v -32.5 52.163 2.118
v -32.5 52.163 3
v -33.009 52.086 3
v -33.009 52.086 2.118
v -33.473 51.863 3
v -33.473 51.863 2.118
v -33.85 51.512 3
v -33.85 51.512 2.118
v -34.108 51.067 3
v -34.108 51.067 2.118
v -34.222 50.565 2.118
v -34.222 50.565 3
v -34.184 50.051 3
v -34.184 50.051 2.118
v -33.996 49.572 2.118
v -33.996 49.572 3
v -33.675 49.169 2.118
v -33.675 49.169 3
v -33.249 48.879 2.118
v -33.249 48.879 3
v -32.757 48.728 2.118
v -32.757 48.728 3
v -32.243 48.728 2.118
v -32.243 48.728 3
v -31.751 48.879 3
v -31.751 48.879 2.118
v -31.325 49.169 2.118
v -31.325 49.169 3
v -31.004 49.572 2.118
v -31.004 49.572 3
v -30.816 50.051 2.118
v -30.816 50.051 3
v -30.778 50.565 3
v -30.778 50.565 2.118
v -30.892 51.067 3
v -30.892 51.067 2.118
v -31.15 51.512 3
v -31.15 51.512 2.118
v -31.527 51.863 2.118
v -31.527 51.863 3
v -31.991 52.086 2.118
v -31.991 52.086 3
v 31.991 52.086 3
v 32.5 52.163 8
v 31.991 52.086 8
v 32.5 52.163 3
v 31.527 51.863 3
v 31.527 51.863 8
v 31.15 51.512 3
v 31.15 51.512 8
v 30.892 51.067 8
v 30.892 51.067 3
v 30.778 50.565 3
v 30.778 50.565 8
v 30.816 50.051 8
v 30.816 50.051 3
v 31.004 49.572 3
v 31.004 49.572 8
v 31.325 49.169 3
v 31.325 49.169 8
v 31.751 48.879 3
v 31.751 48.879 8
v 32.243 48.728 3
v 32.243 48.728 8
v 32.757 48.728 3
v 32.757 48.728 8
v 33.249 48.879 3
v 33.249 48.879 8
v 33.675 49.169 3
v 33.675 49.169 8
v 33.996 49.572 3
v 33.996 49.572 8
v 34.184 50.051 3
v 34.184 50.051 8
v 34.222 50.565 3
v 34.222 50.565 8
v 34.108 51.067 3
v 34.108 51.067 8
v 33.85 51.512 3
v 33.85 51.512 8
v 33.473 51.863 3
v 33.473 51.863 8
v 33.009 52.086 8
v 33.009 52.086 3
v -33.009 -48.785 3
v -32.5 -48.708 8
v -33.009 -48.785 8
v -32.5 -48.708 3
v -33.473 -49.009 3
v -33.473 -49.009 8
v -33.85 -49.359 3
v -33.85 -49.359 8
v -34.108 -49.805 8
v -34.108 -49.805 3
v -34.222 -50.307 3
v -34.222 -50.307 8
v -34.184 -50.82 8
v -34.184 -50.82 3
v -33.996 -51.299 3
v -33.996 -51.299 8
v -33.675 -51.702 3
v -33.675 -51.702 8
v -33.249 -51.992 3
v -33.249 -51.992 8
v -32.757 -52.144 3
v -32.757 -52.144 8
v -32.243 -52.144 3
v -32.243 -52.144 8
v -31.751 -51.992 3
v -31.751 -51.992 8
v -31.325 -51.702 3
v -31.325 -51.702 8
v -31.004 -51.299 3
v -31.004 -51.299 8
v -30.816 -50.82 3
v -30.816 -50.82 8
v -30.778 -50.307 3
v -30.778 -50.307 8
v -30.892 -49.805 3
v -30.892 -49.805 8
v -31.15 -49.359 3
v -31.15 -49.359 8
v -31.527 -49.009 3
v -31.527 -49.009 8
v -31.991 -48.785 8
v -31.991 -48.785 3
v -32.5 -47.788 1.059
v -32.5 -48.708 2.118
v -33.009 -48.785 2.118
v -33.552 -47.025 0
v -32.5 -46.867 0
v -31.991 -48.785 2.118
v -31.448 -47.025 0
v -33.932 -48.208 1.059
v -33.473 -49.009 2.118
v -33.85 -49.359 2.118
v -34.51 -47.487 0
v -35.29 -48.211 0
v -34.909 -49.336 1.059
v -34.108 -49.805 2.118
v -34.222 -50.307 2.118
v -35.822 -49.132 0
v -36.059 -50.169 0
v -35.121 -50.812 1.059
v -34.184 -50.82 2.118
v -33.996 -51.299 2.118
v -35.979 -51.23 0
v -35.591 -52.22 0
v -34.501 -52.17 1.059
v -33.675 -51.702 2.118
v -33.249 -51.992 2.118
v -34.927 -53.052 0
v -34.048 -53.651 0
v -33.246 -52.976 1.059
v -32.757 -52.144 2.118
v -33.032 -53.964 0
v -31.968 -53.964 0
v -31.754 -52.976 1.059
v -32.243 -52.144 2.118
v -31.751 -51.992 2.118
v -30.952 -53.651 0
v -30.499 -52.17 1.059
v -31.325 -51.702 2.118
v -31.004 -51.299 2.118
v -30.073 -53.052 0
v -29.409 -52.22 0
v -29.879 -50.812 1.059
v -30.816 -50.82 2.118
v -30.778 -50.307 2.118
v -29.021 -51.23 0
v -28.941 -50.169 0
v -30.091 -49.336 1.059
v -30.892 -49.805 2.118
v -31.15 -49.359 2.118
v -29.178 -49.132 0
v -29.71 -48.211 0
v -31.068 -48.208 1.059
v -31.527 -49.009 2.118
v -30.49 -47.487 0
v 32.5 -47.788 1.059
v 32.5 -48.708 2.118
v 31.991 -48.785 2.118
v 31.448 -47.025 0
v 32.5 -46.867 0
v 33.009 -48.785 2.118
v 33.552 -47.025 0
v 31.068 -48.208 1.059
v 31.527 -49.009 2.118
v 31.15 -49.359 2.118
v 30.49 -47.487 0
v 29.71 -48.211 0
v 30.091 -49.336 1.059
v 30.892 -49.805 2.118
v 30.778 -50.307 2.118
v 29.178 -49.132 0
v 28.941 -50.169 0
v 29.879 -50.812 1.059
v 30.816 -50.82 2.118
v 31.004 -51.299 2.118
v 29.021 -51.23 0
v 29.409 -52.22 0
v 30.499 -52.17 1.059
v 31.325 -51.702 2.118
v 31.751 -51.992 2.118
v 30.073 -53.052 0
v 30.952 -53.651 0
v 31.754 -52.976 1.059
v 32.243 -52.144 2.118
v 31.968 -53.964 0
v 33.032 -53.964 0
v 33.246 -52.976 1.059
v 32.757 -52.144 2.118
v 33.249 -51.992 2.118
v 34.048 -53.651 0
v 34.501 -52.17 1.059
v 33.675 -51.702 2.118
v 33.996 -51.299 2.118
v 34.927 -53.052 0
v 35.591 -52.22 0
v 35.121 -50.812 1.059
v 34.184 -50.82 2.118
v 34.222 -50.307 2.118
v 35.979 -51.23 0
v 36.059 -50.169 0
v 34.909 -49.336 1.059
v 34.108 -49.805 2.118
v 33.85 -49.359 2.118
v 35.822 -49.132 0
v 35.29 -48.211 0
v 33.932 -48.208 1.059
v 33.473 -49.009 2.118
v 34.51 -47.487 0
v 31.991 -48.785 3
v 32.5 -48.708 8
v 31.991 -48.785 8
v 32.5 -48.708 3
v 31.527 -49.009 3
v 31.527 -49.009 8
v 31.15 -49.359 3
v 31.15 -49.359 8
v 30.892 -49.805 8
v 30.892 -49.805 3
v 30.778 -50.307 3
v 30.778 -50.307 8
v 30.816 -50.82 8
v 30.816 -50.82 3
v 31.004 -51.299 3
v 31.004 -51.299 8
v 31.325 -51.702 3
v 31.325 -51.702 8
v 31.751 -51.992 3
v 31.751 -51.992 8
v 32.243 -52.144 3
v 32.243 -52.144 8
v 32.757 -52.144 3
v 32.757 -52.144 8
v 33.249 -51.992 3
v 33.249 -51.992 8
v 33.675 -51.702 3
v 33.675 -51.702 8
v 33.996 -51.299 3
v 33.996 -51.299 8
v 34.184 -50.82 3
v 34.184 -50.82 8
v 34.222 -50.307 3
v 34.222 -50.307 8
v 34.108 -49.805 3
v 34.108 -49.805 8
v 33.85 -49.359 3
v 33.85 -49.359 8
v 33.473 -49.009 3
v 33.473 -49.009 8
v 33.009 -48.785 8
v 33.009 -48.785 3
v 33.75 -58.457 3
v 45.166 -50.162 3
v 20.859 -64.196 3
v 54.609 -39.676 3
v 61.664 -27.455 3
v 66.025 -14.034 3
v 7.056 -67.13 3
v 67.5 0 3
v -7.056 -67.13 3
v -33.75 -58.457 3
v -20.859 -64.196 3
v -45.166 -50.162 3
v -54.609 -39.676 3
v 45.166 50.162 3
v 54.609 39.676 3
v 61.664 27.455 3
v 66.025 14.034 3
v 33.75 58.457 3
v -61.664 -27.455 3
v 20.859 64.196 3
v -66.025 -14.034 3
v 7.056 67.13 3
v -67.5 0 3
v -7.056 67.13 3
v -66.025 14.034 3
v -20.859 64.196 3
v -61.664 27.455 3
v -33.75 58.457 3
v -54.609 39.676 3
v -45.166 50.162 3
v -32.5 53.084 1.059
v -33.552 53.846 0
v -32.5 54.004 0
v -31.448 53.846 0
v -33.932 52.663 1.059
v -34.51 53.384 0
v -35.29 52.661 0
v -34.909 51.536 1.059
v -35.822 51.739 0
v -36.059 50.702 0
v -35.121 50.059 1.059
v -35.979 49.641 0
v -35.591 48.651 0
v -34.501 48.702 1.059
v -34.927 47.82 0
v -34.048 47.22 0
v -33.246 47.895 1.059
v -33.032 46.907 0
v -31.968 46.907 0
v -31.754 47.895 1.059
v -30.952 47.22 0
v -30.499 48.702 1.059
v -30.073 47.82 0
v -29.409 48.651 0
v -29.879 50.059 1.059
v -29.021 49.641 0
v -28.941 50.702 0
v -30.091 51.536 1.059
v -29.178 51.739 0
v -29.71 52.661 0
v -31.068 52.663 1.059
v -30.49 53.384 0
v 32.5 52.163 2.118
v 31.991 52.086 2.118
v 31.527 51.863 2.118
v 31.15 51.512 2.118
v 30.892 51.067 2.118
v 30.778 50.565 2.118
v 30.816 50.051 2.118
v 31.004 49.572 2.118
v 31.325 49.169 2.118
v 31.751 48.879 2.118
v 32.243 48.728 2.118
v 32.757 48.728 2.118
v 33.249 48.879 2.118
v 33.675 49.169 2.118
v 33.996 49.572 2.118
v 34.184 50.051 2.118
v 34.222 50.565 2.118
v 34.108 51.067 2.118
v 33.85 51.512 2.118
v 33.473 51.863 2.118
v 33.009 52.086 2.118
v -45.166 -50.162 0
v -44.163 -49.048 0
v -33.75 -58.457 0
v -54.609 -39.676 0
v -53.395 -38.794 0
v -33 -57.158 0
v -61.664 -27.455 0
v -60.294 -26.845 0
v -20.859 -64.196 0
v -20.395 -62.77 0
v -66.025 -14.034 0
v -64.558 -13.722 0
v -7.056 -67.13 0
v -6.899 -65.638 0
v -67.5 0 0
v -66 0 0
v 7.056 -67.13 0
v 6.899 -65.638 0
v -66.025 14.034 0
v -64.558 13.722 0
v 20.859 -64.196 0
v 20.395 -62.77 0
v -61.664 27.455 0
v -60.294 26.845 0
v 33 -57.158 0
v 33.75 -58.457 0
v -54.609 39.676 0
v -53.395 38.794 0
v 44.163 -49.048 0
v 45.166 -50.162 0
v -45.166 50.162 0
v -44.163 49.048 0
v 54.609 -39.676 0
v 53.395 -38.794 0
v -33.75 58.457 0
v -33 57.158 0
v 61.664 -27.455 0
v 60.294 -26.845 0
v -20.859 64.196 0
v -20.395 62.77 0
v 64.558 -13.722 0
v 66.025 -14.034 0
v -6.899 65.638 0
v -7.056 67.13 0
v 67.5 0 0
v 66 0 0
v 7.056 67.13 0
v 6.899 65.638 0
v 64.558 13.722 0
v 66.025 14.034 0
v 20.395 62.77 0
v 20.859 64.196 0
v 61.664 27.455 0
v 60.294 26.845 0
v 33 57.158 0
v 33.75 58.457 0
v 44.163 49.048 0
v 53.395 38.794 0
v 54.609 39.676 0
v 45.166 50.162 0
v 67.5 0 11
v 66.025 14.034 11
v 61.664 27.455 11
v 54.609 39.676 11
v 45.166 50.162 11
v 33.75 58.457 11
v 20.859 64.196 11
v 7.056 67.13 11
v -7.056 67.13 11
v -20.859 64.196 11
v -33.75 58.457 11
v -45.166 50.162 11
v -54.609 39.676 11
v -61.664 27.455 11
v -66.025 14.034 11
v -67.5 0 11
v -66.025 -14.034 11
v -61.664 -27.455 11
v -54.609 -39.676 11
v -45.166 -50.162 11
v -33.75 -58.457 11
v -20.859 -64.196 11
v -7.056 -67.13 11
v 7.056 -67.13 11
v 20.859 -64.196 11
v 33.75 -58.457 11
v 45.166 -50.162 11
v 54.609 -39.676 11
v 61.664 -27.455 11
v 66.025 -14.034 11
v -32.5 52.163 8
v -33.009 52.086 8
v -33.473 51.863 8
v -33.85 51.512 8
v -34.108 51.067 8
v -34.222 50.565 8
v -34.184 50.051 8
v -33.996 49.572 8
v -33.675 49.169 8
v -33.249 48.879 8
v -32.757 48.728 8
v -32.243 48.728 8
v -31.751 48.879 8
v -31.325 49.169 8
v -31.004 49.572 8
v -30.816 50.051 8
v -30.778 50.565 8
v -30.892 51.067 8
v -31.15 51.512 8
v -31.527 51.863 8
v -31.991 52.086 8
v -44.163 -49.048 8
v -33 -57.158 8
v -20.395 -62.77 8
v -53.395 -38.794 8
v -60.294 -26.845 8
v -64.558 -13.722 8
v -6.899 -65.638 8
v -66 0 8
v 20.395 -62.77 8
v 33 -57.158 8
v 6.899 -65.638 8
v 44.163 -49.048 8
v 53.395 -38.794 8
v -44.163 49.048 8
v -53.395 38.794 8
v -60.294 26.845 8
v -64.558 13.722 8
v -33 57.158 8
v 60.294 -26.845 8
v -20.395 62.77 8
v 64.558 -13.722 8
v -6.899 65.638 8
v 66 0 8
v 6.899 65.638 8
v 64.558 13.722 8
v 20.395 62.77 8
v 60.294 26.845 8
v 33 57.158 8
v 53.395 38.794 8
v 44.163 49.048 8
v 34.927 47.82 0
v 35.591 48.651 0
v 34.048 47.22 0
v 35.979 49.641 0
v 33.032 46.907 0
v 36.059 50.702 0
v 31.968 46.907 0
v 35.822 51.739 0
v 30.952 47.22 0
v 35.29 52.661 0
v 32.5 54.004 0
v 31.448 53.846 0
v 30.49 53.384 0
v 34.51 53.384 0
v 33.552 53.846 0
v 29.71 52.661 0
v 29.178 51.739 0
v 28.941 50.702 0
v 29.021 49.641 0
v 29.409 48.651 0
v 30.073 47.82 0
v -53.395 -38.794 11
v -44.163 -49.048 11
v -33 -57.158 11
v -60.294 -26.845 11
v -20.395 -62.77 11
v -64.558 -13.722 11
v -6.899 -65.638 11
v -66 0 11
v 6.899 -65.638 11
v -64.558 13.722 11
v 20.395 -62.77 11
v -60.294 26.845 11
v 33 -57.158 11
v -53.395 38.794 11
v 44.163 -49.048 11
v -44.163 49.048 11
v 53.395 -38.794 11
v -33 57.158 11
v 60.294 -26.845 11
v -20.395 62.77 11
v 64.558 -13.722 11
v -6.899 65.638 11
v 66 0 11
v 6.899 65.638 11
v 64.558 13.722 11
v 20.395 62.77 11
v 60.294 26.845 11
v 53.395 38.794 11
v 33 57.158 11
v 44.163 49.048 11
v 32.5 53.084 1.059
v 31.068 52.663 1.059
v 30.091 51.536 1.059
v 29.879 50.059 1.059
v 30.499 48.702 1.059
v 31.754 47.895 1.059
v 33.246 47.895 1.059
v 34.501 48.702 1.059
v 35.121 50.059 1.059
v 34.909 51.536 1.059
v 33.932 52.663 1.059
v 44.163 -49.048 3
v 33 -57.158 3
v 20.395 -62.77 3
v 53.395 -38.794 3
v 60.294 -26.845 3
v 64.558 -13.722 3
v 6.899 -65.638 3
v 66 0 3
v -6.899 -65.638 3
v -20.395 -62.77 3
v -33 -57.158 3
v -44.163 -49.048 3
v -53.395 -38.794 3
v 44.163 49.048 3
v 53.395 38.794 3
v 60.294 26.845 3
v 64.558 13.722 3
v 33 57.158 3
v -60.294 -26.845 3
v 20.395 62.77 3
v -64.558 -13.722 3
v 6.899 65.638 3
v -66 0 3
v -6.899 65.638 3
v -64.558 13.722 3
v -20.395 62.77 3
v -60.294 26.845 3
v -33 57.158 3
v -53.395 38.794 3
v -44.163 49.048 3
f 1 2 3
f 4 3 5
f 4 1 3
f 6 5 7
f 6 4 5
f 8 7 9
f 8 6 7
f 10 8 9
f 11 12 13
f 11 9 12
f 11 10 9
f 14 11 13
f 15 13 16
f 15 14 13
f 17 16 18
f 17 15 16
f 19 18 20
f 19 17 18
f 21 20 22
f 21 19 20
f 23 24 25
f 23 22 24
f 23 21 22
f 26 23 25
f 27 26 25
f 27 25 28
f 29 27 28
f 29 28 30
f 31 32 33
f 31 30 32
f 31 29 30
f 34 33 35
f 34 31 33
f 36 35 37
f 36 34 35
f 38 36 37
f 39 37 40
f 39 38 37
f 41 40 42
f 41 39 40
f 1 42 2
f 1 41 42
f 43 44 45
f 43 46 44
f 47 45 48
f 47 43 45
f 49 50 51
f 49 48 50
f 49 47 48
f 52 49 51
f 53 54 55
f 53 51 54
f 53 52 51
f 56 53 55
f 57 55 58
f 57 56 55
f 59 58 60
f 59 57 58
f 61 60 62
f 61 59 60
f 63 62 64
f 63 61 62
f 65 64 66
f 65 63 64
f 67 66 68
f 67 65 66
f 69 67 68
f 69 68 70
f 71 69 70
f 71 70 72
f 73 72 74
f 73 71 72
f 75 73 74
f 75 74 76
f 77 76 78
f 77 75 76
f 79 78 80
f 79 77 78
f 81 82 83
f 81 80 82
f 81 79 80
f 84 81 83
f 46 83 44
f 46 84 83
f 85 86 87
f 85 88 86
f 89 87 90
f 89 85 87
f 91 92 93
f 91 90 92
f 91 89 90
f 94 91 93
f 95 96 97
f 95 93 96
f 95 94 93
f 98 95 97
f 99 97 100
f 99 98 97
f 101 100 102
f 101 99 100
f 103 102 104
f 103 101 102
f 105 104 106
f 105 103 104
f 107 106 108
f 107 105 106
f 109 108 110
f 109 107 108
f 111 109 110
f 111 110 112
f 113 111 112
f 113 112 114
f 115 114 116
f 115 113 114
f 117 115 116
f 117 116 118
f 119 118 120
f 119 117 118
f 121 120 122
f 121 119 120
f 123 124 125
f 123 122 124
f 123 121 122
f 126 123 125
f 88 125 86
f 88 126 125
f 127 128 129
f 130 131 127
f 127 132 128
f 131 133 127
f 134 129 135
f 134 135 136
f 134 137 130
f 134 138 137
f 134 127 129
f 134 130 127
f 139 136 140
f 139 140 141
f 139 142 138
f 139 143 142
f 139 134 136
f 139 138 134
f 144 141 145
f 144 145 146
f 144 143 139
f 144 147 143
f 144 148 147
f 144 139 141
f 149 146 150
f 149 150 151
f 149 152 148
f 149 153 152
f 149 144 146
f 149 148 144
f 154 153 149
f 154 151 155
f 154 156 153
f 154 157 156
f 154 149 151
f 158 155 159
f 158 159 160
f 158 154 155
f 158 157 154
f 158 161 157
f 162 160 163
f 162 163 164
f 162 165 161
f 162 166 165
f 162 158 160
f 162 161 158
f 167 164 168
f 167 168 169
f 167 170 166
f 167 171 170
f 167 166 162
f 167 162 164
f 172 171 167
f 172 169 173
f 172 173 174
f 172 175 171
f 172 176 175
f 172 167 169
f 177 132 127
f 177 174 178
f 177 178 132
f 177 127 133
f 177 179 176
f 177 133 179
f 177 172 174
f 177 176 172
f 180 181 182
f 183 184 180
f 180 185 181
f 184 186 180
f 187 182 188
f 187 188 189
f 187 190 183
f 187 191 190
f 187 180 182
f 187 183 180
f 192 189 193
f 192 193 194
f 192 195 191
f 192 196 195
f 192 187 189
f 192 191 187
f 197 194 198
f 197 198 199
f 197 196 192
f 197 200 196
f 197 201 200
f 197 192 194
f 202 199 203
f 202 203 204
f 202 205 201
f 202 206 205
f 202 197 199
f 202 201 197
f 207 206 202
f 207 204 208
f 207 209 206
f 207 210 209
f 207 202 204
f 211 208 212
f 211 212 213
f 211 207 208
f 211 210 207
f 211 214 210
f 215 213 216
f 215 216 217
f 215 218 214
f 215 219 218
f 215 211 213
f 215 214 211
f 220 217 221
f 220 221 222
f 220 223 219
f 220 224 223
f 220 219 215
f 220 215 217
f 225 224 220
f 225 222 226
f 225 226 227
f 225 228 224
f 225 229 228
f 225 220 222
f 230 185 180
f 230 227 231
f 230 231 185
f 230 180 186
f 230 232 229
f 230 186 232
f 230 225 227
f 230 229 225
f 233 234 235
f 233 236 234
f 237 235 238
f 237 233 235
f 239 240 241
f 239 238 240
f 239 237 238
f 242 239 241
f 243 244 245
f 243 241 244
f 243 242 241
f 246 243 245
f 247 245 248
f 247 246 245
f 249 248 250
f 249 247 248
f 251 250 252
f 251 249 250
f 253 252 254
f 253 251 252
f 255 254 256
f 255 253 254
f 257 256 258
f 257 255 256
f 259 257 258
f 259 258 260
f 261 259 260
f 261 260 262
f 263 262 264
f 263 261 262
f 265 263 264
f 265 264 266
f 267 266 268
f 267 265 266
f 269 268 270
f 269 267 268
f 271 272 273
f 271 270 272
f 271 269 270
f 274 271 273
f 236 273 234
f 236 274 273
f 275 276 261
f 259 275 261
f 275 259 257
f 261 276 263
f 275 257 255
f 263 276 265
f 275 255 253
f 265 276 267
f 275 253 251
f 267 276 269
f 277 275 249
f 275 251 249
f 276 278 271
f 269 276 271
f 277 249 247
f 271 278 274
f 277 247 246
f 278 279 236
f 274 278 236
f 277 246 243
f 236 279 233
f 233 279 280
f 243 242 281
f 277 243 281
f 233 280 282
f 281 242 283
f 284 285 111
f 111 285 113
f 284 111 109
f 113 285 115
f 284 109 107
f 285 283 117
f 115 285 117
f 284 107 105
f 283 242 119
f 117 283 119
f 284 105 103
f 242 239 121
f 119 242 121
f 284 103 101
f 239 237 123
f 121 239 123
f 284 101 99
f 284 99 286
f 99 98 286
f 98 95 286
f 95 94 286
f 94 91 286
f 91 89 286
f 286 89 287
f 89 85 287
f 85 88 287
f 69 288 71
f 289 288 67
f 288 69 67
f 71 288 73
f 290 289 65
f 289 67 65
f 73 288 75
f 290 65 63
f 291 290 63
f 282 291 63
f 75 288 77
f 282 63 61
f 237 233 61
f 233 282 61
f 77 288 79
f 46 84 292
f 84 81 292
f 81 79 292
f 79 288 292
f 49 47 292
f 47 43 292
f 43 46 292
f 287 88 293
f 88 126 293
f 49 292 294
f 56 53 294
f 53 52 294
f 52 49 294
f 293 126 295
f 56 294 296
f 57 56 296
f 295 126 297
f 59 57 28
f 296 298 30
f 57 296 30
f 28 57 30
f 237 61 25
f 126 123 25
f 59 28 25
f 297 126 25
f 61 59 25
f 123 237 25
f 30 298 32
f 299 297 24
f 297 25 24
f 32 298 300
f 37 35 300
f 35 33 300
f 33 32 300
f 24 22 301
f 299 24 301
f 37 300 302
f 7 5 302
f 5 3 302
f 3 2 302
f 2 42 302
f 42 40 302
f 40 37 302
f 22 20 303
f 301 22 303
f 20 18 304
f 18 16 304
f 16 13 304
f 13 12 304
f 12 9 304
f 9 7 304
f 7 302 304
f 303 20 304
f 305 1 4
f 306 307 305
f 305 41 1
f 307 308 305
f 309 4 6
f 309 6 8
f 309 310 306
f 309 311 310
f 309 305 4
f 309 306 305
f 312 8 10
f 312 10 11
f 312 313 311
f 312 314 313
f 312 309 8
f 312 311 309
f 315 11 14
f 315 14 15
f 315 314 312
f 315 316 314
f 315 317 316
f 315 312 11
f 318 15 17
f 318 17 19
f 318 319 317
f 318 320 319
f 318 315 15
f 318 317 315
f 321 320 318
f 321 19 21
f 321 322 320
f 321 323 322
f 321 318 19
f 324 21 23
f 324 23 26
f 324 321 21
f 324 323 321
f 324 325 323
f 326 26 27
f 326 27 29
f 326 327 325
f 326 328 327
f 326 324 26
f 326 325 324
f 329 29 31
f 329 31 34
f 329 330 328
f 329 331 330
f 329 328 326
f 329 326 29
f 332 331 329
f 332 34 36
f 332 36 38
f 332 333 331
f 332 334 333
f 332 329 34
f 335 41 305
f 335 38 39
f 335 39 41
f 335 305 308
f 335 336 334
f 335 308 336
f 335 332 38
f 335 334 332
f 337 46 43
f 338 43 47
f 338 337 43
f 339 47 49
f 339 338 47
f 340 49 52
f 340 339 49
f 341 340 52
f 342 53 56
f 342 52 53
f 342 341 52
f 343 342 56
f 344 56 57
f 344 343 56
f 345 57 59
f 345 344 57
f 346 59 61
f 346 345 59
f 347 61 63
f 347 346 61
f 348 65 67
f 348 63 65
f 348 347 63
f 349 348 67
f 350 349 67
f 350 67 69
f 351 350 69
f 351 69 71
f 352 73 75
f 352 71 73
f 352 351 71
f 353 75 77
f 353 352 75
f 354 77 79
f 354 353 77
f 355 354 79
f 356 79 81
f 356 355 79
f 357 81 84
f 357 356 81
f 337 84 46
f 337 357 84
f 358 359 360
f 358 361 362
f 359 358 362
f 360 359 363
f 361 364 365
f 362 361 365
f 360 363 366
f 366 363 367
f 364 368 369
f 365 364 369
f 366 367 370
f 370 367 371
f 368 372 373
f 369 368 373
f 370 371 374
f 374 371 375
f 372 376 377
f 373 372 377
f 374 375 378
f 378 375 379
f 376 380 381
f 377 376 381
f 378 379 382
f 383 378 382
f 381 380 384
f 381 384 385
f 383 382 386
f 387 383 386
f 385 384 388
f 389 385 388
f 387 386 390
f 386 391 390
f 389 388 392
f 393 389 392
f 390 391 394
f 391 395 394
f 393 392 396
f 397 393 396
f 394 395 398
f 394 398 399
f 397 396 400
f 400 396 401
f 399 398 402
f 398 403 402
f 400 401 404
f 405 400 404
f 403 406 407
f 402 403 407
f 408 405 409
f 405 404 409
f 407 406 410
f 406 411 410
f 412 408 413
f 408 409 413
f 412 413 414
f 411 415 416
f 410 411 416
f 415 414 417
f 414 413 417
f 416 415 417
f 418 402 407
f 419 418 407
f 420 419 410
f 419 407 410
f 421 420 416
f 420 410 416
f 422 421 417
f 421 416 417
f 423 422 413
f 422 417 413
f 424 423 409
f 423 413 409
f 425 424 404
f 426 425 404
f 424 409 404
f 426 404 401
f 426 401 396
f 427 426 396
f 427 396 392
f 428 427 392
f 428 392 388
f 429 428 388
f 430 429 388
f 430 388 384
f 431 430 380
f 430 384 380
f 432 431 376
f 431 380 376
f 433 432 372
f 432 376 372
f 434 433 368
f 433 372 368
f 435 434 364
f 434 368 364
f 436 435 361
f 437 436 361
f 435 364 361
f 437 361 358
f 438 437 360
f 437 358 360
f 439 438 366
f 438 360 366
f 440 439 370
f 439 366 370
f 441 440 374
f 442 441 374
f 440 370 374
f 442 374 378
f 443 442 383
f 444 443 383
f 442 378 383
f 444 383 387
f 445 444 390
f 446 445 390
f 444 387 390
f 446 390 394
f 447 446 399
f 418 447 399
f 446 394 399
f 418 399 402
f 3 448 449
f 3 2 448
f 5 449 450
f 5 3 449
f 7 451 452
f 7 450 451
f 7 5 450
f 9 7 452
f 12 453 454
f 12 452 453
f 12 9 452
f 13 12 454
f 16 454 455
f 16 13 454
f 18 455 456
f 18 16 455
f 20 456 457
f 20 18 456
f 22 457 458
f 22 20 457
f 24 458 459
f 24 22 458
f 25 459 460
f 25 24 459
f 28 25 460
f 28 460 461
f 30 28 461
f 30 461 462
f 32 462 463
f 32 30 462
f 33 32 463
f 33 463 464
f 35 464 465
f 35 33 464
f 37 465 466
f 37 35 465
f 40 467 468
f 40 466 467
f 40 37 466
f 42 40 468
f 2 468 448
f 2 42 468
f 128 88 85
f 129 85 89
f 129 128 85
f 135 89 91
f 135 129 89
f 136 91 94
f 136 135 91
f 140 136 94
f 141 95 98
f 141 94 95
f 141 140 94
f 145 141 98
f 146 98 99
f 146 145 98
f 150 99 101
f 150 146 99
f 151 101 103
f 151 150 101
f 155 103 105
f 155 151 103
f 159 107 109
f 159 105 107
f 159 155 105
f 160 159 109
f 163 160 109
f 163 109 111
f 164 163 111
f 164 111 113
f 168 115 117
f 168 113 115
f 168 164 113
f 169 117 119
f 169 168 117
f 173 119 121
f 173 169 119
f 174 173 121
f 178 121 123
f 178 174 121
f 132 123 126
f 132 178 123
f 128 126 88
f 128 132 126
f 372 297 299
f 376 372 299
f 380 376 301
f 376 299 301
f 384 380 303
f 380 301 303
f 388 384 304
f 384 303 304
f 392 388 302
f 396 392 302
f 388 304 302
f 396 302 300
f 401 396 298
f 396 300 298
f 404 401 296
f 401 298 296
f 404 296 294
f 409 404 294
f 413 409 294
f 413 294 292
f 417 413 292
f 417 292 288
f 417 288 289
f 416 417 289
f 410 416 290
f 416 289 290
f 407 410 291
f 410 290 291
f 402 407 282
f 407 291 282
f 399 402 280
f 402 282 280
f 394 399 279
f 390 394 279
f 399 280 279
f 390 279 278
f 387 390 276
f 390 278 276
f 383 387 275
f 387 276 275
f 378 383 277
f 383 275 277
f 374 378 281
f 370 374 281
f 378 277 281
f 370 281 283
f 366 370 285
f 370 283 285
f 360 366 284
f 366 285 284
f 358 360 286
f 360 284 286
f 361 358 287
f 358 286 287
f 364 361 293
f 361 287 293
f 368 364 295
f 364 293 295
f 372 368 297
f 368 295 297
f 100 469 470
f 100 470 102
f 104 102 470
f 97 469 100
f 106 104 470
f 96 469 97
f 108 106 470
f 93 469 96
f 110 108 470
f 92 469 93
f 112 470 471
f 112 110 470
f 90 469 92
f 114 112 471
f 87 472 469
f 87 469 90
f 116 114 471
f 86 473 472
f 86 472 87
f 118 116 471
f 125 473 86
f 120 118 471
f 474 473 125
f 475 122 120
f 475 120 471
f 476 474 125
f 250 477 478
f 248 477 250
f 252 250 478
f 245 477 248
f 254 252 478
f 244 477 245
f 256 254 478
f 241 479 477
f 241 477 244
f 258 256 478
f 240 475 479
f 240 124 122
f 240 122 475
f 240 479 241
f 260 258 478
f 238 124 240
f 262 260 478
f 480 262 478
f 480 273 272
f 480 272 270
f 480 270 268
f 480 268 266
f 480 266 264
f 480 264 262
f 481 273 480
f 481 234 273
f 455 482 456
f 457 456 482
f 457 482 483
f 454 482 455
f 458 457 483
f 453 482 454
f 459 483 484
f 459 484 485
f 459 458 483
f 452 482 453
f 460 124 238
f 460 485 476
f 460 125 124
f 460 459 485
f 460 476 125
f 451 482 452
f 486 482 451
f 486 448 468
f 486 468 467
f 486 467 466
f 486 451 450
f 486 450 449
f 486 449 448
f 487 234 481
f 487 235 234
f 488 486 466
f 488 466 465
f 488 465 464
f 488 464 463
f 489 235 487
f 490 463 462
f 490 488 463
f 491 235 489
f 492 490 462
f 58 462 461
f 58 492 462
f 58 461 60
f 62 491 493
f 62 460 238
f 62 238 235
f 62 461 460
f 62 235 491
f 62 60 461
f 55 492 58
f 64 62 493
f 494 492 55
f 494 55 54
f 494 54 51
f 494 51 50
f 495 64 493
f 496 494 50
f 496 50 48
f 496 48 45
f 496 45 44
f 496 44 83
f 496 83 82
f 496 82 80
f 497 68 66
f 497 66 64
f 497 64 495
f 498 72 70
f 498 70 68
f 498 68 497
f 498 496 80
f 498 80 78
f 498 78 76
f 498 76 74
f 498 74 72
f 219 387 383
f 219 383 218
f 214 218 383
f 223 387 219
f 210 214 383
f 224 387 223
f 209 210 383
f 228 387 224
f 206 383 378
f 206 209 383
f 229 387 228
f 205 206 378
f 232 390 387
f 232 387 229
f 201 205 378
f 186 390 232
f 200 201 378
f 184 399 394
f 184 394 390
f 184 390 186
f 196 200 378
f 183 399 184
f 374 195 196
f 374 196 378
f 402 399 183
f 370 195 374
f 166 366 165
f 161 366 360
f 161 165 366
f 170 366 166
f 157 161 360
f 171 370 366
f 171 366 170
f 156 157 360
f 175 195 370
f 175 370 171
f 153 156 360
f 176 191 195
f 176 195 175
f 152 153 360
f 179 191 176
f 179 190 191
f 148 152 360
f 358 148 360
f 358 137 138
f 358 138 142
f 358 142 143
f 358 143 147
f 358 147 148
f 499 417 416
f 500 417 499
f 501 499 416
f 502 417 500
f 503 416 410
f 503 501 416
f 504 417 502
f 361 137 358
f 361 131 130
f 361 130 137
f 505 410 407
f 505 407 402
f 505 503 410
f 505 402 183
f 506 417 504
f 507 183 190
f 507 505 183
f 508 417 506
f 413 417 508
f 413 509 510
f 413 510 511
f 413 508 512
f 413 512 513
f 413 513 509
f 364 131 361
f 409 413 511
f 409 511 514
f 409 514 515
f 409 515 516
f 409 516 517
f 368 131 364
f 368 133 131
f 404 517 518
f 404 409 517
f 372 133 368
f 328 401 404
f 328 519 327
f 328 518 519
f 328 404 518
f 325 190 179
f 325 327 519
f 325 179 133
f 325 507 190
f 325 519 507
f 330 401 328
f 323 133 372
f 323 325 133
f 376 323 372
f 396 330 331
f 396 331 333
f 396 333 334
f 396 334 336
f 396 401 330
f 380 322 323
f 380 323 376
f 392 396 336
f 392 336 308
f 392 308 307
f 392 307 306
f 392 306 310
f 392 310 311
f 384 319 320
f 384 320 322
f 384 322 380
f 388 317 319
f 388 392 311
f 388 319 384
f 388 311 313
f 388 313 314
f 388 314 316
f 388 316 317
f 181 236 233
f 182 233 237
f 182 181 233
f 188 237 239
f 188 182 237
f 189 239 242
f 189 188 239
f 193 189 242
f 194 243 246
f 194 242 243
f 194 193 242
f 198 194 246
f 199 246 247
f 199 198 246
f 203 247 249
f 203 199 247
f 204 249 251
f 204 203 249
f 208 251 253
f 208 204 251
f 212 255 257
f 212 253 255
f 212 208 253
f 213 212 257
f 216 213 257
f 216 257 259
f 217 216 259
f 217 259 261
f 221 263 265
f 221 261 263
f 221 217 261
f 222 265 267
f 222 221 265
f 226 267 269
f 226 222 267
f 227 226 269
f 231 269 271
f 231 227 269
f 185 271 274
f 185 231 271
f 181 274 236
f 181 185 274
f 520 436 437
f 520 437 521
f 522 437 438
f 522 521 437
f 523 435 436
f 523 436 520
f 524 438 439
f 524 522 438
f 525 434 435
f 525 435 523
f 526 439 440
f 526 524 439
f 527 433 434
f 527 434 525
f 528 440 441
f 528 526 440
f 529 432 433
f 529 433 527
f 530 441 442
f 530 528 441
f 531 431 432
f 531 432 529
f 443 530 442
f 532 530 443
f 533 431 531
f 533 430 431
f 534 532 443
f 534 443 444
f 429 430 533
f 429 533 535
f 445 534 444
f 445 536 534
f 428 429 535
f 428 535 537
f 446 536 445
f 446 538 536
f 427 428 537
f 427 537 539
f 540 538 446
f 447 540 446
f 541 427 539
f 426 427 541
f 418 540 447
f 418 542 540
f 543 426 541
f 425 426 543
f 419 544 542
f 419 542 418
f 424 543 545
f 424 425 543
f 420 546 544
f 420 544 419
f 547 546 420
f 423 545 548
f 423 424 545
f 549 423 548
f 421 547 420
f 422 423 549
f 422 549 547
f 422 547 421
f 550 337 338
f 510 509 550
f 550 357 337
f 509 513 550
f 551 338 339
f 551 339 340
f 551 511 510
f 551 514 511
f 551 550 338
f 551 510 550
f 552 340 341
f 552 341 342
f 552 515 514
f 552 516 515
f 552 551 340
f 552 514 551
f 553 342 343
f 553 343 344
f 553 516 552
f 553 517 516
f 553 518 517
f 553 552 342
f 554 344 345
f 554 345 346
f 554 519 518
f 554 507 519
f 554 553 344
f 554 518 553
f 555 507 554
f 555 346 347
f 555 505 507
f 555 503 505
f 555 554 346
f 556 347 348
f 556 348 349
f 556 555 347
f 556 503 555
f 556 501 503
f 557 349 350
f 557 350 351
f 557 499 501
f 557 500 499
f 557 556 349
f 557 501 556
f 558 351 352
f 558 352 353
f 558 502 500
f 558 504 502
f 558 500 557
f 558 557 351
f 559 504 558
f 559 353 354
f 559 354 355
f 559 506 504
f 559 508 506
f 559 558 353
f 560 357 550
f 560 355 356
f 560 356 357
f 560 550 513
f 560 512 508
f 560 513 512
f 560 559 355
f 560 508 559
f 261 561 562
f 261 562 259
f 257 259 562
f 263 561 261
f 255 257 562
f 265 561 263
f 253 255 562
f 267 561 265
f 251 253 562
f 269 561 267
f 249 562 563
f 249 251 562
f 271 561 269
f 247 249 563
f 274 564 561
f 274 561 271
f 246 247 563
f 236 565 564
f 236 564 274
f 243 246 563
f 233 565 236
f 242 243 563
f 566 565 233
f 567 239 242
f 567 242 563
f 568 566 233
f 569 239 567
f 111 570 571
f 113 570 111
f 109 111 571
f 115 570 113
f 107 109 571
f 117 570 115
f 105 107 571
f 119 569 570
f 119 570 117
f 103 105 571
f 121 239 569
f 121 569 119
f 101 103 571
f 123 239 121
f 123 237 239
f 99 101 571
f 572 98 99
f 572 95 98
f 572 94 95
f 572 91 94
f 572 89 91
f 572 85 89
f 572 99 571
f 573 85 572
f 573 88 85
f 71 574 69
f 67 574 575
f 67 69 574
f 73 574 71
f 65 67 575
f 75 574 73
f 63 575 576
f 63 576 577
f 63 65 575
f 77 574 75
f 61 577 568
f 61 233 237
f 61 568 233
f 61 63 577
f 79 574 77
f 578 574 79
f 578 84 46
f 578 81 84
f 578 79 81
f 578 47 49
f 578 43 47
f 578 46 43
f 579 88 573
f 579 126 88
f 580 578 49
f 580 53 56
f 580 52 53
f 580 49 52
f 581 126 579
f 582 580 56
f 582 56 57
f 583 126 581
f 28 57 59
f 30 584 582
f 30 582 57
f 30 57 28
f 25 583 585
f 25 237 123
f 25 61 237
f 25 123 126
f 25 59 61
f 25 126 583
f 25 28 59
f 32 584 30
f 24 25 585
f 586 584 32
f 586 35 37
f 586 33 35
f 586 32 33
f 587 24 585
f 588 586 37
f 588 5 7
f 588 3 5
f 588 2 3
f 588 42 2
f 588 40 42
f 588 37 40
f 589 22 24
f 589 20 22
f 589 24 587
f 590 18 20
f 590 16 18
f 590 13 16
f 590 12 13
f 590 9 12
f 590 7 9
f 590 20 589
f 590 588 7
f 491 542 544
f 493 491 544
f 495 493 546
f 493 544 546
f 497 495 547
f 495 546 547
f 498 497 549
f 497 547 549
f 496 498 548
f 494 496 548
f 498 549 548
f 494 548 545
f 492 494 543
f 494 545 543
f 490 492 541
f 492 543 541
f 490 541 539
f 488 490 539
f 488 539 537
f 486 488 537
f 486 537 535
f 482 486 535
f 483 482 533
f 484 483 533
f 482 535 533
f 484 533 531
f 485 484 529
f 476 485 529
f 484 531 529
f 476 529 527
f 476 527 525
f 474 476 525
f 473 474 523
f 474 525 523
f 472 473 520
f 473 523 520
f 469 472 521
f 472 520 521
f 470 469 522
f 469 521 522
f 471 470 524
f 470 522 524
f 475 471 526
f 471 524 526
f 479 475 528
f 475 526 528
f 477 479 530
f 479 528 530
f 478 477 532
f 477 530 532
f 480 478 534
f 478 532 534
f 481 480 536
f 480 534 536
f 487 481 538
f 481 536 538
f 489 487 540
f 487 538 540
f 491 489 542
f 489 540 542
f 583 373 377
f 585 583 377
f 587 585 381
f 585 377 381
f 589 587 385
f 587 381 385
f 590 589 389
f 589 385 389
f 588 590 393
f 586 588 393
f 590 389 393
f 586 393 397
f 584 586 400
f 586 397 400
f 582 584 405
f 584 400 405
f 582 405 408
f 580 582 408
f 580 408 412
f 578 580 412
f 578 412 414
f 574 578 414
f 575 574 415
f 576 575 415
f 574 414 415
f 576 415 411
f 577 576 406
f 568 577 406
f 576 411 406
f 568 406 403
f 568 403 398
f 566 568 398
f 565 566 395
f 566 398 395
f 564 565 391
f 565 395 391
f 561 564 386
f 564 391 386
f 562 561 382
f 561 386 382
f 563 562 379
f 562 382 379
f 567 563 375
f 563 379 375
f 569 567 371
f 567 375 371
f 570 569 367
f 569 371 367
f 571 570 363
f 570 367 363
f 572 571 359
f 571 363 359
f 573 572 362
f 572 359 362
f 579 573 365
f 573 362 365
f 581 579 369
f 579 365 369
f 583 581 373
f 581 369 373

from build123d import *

# Parameters (mm, degrees)
SKETCH2_R                                     = 67.5
BOSS_EXTRUDE2_DEPTH                           = 11
SKETCH3_R                                     = 66
CUT_EXTRUDE11_DEPTH                           = 3
SKETCH15_R                                    = 66
CUT_EXTRUDE14_DEPTH                           = 3
SKETCH28_R                                    = 67.5
BOSS_EXTRUDE14_DEPTH                          = 3
CSK_FOR_5_FLAT_HEAD_SOCKET_CAP_SCREW5_A_COUNT = 2
CSK_FOR_5_FLAT_HEAD_SOCKET_CAP_SCREW5_A_PITCH = 65
CSK_FOR_5_FLAT_HEAD_SOCKET_CAP_SCRE_2_COUNT   = 2
CSK_FOR_5_FLAT_HEAD_SOCKET_CAP_SCRE_2_PITCH   = 120.000003622
CSK_FOR_5_FLAT_HEAD_SOCKET_CAP_SCRE_3_COUNT   = 2
CSK_FOR_5_FLAT_HEAD_SOCKET_CAP_SCRE_3_PITCH   = 100.871205009


with BuildPart() as part:
    # Sketch2 → Boss-Extrude2 (new body)
    with BuildSketch(Plane.XY):
        Circle(SKETCH2_R)
    extrude(amount=BOSS_EXTRUDE2_DEPTH)

    # Sketch3 → Cut-Extrude11 (cut)
    with BuildSketch(Plane(origin=(0, 0, 0), x_dir=(-1, 0, 0), z_dir=(0, 0, -1))):
        Circle(SKETCH3_R)
    extrude(amount=-CUT_EXTRUDE11_DEPTH, mode=Mode.SUBTRACT)

    # Sketch15 → Cut-Extrude14 (cut)
    with BuildSketch(Plane.XY.offset(11)):
        Circle(SKETCH15_R)
    extrude(amount=-CUT_EXTRUDE14_DEPTH, mode=Mode.SUBTRACT)


with BuildPart() as body_2:
    # Sketch28 → Boss-Extrude14 (new body)
    with BuildSketch(Plane(origin=(0, 0, 3), x_dir=(-1, 0, 0), z_dir=(0, 0, -1))):
        Circle(SKETCH28_R)
    extrude(amount=BOSS_EXTRUDE14_DEPTH)


with BuildPart() as csk_for_5_flat_head_socket_cap_screw5_tool:
    # Sketch30 → CSK for #5 Flat Head Socket Cap Screw5 (revolve)
    with BuildSketch(Plane(origin=(32.500003343, 50.435602505, 0), x_dir=(0, 1, 0), z_dir=(1, 0, 0))):
        Polygon((0, 0), (0, 69.377806461), (1.7272, 68.34), (1.7272, 2.118403422), (3.5687, 0), align=None)
    csk_for_5_flat_head_socket_cap_screw5 = revolve(axis=Axis((32.500003343, 50.435602505, -6.35), (0, 0, 1)))


with BuildPart() as part_1:
    add(part.part)

    # CSK for #5 Flat Head Socket Cap Screw5: cut by csk_for_5_flat_head_socket_cap_screw5_tool
    add(csk_for_5_flat_head_socket_cap_screw5_tool.part, mode=Mode.SUBTRACT)


with BuildPart() as body_2_1:
    add(body_2.part)

    # CSK for #5 Flat Head Socket Cap Screw5: cut by csk_for_5_flat_head_socket_cap_screw5_tool
    add(csk_for_5_flat_head_socket_cap_screw5_tool.part, mode=Mode.SUBTRACT)


with BuildPart() as csk_for_5_flat_head_socket_cap_screw5_a_tool:
    # CSK for #5 Flat Head Socket Cap Screw5 a: CSK for #5 Flat Head Socket Cap Screw5 ×2
    with Locations(*[(-i * CSK_FOR_5_FLAT_HEAD_SOCKET_CAP_SCREW5_A_PITCH, 0, 0) for i in range(1, CSK_FOR_5_FLAT_HEAD_SOCKET_CAP_SCREW5_A_COUNT)]):
        add(csk_for_5_flat_head_socket_cap_screw5)


with BuildPart() as part_2:
    add(part_1.part)

    # CSK for #5 Flat Head Socket Cap Screw5 a: cut by csk_for_5_flat_head_socket_cap_screw5_a_tool
    add(csk_for_5_flat_head_socket_cap_screw5_a_tool.part, mode=Mode.SUBTRACT)


with BuildPart() as body_2_2:
    add(body_2_1.part)

    # CSK for #5 Flat Head Socket Cap Screw5 a: cut by csk_for_5_flat_head_socket_cap_screw5_a_tool
    add(csk_for_5_flat_head_socket_cap_screw5_a_tool.part, mode=Mode.SUBTRACT)


with BuildPart() as csk_for_5_flat_head_socket_cap_scre_2_tool:
    # CSK for _5 Flat Head Socket Cap Scre 2: CSK for #5 Flat Head Socket Cap Screw5 ×2
    with Locations(*[Vector(-0.541666706, -0.84059335, 0) * (i * CSK_FOR_5_FLAT_HEAD_SOCKET_CAP_SCRE_2_PITCH) for i in range(1, CSK_FOR_5_FLAT_HEAD_SOCKET_CAP_SCRE_2_COUNT)]):
        add(csk_for_5_flat_head_socket_cap_screw5)


with BuildPart() as part_3:
    add(part_2.part)

    # CSK for _5 Flat Head Socket Cap Scre 2: cut by csk_for_5_flat_head_socket_cap_scre_2_tool
    add(csk_for_5_flat_head_socket_cap_scre_2_tool.part, mode=Mode.SUBTRACT)


with BuildPart() as body_2_3:
    add(body_2_2.part)

    # CSK for _5 Flat Head Socket Cap Scre 2: cut by csk_for_5_flat_head_socket_cap_scre_2_tool
    add(csk_for_5_flat_head_socket_cap_scre_2_tool.part, mode=Mode.SUBTRACT)


with BuildPart() as csk_for_5_flat_head_socket_cap_scre_3_tool:
    # CSK for _5 Flat Head Socket Cap Scre 3: CSK for #5 Flat Head Socket Cap Screw5 ×2
    with Locations(*[(0, -i * CSK_FOR_5_FLAT_HEAD_SOCKET_CAP_SCRE_3_PITCH, 0) for i in range(1, CSK_FOR_5_FLAT_HEAD_SOCKET_CAP_SCRE_3_COUNT)]):
        add(csk_for_5_flat_head_socket_cap_screw5)


with BuildPart() as part_4:
    add(part_3.part)

    # CSK for _5 Flat Head Socket Cap Scre 3: cut by csk_for_5_flat_head_socket_cap_scre_3_tool
    add(csk_for_5_flat_head_socket_cap_scre_3_tool.part, mode=Mode.SUBTRACT)


with BuildPart() as body_2_4:
    add(body_2_3.part)

    # CSK for _5 Flat Head Socket Cap Scre 3: cut by csk_for_5_flat_head_socket_cap_scre_3_tool
    add(csk_for_5_flat_head_socket_cap_scre_3_tool.part, mode=Mode.SUBTRACT)


solid = Compound([part_4.part, body_2_4.part])
